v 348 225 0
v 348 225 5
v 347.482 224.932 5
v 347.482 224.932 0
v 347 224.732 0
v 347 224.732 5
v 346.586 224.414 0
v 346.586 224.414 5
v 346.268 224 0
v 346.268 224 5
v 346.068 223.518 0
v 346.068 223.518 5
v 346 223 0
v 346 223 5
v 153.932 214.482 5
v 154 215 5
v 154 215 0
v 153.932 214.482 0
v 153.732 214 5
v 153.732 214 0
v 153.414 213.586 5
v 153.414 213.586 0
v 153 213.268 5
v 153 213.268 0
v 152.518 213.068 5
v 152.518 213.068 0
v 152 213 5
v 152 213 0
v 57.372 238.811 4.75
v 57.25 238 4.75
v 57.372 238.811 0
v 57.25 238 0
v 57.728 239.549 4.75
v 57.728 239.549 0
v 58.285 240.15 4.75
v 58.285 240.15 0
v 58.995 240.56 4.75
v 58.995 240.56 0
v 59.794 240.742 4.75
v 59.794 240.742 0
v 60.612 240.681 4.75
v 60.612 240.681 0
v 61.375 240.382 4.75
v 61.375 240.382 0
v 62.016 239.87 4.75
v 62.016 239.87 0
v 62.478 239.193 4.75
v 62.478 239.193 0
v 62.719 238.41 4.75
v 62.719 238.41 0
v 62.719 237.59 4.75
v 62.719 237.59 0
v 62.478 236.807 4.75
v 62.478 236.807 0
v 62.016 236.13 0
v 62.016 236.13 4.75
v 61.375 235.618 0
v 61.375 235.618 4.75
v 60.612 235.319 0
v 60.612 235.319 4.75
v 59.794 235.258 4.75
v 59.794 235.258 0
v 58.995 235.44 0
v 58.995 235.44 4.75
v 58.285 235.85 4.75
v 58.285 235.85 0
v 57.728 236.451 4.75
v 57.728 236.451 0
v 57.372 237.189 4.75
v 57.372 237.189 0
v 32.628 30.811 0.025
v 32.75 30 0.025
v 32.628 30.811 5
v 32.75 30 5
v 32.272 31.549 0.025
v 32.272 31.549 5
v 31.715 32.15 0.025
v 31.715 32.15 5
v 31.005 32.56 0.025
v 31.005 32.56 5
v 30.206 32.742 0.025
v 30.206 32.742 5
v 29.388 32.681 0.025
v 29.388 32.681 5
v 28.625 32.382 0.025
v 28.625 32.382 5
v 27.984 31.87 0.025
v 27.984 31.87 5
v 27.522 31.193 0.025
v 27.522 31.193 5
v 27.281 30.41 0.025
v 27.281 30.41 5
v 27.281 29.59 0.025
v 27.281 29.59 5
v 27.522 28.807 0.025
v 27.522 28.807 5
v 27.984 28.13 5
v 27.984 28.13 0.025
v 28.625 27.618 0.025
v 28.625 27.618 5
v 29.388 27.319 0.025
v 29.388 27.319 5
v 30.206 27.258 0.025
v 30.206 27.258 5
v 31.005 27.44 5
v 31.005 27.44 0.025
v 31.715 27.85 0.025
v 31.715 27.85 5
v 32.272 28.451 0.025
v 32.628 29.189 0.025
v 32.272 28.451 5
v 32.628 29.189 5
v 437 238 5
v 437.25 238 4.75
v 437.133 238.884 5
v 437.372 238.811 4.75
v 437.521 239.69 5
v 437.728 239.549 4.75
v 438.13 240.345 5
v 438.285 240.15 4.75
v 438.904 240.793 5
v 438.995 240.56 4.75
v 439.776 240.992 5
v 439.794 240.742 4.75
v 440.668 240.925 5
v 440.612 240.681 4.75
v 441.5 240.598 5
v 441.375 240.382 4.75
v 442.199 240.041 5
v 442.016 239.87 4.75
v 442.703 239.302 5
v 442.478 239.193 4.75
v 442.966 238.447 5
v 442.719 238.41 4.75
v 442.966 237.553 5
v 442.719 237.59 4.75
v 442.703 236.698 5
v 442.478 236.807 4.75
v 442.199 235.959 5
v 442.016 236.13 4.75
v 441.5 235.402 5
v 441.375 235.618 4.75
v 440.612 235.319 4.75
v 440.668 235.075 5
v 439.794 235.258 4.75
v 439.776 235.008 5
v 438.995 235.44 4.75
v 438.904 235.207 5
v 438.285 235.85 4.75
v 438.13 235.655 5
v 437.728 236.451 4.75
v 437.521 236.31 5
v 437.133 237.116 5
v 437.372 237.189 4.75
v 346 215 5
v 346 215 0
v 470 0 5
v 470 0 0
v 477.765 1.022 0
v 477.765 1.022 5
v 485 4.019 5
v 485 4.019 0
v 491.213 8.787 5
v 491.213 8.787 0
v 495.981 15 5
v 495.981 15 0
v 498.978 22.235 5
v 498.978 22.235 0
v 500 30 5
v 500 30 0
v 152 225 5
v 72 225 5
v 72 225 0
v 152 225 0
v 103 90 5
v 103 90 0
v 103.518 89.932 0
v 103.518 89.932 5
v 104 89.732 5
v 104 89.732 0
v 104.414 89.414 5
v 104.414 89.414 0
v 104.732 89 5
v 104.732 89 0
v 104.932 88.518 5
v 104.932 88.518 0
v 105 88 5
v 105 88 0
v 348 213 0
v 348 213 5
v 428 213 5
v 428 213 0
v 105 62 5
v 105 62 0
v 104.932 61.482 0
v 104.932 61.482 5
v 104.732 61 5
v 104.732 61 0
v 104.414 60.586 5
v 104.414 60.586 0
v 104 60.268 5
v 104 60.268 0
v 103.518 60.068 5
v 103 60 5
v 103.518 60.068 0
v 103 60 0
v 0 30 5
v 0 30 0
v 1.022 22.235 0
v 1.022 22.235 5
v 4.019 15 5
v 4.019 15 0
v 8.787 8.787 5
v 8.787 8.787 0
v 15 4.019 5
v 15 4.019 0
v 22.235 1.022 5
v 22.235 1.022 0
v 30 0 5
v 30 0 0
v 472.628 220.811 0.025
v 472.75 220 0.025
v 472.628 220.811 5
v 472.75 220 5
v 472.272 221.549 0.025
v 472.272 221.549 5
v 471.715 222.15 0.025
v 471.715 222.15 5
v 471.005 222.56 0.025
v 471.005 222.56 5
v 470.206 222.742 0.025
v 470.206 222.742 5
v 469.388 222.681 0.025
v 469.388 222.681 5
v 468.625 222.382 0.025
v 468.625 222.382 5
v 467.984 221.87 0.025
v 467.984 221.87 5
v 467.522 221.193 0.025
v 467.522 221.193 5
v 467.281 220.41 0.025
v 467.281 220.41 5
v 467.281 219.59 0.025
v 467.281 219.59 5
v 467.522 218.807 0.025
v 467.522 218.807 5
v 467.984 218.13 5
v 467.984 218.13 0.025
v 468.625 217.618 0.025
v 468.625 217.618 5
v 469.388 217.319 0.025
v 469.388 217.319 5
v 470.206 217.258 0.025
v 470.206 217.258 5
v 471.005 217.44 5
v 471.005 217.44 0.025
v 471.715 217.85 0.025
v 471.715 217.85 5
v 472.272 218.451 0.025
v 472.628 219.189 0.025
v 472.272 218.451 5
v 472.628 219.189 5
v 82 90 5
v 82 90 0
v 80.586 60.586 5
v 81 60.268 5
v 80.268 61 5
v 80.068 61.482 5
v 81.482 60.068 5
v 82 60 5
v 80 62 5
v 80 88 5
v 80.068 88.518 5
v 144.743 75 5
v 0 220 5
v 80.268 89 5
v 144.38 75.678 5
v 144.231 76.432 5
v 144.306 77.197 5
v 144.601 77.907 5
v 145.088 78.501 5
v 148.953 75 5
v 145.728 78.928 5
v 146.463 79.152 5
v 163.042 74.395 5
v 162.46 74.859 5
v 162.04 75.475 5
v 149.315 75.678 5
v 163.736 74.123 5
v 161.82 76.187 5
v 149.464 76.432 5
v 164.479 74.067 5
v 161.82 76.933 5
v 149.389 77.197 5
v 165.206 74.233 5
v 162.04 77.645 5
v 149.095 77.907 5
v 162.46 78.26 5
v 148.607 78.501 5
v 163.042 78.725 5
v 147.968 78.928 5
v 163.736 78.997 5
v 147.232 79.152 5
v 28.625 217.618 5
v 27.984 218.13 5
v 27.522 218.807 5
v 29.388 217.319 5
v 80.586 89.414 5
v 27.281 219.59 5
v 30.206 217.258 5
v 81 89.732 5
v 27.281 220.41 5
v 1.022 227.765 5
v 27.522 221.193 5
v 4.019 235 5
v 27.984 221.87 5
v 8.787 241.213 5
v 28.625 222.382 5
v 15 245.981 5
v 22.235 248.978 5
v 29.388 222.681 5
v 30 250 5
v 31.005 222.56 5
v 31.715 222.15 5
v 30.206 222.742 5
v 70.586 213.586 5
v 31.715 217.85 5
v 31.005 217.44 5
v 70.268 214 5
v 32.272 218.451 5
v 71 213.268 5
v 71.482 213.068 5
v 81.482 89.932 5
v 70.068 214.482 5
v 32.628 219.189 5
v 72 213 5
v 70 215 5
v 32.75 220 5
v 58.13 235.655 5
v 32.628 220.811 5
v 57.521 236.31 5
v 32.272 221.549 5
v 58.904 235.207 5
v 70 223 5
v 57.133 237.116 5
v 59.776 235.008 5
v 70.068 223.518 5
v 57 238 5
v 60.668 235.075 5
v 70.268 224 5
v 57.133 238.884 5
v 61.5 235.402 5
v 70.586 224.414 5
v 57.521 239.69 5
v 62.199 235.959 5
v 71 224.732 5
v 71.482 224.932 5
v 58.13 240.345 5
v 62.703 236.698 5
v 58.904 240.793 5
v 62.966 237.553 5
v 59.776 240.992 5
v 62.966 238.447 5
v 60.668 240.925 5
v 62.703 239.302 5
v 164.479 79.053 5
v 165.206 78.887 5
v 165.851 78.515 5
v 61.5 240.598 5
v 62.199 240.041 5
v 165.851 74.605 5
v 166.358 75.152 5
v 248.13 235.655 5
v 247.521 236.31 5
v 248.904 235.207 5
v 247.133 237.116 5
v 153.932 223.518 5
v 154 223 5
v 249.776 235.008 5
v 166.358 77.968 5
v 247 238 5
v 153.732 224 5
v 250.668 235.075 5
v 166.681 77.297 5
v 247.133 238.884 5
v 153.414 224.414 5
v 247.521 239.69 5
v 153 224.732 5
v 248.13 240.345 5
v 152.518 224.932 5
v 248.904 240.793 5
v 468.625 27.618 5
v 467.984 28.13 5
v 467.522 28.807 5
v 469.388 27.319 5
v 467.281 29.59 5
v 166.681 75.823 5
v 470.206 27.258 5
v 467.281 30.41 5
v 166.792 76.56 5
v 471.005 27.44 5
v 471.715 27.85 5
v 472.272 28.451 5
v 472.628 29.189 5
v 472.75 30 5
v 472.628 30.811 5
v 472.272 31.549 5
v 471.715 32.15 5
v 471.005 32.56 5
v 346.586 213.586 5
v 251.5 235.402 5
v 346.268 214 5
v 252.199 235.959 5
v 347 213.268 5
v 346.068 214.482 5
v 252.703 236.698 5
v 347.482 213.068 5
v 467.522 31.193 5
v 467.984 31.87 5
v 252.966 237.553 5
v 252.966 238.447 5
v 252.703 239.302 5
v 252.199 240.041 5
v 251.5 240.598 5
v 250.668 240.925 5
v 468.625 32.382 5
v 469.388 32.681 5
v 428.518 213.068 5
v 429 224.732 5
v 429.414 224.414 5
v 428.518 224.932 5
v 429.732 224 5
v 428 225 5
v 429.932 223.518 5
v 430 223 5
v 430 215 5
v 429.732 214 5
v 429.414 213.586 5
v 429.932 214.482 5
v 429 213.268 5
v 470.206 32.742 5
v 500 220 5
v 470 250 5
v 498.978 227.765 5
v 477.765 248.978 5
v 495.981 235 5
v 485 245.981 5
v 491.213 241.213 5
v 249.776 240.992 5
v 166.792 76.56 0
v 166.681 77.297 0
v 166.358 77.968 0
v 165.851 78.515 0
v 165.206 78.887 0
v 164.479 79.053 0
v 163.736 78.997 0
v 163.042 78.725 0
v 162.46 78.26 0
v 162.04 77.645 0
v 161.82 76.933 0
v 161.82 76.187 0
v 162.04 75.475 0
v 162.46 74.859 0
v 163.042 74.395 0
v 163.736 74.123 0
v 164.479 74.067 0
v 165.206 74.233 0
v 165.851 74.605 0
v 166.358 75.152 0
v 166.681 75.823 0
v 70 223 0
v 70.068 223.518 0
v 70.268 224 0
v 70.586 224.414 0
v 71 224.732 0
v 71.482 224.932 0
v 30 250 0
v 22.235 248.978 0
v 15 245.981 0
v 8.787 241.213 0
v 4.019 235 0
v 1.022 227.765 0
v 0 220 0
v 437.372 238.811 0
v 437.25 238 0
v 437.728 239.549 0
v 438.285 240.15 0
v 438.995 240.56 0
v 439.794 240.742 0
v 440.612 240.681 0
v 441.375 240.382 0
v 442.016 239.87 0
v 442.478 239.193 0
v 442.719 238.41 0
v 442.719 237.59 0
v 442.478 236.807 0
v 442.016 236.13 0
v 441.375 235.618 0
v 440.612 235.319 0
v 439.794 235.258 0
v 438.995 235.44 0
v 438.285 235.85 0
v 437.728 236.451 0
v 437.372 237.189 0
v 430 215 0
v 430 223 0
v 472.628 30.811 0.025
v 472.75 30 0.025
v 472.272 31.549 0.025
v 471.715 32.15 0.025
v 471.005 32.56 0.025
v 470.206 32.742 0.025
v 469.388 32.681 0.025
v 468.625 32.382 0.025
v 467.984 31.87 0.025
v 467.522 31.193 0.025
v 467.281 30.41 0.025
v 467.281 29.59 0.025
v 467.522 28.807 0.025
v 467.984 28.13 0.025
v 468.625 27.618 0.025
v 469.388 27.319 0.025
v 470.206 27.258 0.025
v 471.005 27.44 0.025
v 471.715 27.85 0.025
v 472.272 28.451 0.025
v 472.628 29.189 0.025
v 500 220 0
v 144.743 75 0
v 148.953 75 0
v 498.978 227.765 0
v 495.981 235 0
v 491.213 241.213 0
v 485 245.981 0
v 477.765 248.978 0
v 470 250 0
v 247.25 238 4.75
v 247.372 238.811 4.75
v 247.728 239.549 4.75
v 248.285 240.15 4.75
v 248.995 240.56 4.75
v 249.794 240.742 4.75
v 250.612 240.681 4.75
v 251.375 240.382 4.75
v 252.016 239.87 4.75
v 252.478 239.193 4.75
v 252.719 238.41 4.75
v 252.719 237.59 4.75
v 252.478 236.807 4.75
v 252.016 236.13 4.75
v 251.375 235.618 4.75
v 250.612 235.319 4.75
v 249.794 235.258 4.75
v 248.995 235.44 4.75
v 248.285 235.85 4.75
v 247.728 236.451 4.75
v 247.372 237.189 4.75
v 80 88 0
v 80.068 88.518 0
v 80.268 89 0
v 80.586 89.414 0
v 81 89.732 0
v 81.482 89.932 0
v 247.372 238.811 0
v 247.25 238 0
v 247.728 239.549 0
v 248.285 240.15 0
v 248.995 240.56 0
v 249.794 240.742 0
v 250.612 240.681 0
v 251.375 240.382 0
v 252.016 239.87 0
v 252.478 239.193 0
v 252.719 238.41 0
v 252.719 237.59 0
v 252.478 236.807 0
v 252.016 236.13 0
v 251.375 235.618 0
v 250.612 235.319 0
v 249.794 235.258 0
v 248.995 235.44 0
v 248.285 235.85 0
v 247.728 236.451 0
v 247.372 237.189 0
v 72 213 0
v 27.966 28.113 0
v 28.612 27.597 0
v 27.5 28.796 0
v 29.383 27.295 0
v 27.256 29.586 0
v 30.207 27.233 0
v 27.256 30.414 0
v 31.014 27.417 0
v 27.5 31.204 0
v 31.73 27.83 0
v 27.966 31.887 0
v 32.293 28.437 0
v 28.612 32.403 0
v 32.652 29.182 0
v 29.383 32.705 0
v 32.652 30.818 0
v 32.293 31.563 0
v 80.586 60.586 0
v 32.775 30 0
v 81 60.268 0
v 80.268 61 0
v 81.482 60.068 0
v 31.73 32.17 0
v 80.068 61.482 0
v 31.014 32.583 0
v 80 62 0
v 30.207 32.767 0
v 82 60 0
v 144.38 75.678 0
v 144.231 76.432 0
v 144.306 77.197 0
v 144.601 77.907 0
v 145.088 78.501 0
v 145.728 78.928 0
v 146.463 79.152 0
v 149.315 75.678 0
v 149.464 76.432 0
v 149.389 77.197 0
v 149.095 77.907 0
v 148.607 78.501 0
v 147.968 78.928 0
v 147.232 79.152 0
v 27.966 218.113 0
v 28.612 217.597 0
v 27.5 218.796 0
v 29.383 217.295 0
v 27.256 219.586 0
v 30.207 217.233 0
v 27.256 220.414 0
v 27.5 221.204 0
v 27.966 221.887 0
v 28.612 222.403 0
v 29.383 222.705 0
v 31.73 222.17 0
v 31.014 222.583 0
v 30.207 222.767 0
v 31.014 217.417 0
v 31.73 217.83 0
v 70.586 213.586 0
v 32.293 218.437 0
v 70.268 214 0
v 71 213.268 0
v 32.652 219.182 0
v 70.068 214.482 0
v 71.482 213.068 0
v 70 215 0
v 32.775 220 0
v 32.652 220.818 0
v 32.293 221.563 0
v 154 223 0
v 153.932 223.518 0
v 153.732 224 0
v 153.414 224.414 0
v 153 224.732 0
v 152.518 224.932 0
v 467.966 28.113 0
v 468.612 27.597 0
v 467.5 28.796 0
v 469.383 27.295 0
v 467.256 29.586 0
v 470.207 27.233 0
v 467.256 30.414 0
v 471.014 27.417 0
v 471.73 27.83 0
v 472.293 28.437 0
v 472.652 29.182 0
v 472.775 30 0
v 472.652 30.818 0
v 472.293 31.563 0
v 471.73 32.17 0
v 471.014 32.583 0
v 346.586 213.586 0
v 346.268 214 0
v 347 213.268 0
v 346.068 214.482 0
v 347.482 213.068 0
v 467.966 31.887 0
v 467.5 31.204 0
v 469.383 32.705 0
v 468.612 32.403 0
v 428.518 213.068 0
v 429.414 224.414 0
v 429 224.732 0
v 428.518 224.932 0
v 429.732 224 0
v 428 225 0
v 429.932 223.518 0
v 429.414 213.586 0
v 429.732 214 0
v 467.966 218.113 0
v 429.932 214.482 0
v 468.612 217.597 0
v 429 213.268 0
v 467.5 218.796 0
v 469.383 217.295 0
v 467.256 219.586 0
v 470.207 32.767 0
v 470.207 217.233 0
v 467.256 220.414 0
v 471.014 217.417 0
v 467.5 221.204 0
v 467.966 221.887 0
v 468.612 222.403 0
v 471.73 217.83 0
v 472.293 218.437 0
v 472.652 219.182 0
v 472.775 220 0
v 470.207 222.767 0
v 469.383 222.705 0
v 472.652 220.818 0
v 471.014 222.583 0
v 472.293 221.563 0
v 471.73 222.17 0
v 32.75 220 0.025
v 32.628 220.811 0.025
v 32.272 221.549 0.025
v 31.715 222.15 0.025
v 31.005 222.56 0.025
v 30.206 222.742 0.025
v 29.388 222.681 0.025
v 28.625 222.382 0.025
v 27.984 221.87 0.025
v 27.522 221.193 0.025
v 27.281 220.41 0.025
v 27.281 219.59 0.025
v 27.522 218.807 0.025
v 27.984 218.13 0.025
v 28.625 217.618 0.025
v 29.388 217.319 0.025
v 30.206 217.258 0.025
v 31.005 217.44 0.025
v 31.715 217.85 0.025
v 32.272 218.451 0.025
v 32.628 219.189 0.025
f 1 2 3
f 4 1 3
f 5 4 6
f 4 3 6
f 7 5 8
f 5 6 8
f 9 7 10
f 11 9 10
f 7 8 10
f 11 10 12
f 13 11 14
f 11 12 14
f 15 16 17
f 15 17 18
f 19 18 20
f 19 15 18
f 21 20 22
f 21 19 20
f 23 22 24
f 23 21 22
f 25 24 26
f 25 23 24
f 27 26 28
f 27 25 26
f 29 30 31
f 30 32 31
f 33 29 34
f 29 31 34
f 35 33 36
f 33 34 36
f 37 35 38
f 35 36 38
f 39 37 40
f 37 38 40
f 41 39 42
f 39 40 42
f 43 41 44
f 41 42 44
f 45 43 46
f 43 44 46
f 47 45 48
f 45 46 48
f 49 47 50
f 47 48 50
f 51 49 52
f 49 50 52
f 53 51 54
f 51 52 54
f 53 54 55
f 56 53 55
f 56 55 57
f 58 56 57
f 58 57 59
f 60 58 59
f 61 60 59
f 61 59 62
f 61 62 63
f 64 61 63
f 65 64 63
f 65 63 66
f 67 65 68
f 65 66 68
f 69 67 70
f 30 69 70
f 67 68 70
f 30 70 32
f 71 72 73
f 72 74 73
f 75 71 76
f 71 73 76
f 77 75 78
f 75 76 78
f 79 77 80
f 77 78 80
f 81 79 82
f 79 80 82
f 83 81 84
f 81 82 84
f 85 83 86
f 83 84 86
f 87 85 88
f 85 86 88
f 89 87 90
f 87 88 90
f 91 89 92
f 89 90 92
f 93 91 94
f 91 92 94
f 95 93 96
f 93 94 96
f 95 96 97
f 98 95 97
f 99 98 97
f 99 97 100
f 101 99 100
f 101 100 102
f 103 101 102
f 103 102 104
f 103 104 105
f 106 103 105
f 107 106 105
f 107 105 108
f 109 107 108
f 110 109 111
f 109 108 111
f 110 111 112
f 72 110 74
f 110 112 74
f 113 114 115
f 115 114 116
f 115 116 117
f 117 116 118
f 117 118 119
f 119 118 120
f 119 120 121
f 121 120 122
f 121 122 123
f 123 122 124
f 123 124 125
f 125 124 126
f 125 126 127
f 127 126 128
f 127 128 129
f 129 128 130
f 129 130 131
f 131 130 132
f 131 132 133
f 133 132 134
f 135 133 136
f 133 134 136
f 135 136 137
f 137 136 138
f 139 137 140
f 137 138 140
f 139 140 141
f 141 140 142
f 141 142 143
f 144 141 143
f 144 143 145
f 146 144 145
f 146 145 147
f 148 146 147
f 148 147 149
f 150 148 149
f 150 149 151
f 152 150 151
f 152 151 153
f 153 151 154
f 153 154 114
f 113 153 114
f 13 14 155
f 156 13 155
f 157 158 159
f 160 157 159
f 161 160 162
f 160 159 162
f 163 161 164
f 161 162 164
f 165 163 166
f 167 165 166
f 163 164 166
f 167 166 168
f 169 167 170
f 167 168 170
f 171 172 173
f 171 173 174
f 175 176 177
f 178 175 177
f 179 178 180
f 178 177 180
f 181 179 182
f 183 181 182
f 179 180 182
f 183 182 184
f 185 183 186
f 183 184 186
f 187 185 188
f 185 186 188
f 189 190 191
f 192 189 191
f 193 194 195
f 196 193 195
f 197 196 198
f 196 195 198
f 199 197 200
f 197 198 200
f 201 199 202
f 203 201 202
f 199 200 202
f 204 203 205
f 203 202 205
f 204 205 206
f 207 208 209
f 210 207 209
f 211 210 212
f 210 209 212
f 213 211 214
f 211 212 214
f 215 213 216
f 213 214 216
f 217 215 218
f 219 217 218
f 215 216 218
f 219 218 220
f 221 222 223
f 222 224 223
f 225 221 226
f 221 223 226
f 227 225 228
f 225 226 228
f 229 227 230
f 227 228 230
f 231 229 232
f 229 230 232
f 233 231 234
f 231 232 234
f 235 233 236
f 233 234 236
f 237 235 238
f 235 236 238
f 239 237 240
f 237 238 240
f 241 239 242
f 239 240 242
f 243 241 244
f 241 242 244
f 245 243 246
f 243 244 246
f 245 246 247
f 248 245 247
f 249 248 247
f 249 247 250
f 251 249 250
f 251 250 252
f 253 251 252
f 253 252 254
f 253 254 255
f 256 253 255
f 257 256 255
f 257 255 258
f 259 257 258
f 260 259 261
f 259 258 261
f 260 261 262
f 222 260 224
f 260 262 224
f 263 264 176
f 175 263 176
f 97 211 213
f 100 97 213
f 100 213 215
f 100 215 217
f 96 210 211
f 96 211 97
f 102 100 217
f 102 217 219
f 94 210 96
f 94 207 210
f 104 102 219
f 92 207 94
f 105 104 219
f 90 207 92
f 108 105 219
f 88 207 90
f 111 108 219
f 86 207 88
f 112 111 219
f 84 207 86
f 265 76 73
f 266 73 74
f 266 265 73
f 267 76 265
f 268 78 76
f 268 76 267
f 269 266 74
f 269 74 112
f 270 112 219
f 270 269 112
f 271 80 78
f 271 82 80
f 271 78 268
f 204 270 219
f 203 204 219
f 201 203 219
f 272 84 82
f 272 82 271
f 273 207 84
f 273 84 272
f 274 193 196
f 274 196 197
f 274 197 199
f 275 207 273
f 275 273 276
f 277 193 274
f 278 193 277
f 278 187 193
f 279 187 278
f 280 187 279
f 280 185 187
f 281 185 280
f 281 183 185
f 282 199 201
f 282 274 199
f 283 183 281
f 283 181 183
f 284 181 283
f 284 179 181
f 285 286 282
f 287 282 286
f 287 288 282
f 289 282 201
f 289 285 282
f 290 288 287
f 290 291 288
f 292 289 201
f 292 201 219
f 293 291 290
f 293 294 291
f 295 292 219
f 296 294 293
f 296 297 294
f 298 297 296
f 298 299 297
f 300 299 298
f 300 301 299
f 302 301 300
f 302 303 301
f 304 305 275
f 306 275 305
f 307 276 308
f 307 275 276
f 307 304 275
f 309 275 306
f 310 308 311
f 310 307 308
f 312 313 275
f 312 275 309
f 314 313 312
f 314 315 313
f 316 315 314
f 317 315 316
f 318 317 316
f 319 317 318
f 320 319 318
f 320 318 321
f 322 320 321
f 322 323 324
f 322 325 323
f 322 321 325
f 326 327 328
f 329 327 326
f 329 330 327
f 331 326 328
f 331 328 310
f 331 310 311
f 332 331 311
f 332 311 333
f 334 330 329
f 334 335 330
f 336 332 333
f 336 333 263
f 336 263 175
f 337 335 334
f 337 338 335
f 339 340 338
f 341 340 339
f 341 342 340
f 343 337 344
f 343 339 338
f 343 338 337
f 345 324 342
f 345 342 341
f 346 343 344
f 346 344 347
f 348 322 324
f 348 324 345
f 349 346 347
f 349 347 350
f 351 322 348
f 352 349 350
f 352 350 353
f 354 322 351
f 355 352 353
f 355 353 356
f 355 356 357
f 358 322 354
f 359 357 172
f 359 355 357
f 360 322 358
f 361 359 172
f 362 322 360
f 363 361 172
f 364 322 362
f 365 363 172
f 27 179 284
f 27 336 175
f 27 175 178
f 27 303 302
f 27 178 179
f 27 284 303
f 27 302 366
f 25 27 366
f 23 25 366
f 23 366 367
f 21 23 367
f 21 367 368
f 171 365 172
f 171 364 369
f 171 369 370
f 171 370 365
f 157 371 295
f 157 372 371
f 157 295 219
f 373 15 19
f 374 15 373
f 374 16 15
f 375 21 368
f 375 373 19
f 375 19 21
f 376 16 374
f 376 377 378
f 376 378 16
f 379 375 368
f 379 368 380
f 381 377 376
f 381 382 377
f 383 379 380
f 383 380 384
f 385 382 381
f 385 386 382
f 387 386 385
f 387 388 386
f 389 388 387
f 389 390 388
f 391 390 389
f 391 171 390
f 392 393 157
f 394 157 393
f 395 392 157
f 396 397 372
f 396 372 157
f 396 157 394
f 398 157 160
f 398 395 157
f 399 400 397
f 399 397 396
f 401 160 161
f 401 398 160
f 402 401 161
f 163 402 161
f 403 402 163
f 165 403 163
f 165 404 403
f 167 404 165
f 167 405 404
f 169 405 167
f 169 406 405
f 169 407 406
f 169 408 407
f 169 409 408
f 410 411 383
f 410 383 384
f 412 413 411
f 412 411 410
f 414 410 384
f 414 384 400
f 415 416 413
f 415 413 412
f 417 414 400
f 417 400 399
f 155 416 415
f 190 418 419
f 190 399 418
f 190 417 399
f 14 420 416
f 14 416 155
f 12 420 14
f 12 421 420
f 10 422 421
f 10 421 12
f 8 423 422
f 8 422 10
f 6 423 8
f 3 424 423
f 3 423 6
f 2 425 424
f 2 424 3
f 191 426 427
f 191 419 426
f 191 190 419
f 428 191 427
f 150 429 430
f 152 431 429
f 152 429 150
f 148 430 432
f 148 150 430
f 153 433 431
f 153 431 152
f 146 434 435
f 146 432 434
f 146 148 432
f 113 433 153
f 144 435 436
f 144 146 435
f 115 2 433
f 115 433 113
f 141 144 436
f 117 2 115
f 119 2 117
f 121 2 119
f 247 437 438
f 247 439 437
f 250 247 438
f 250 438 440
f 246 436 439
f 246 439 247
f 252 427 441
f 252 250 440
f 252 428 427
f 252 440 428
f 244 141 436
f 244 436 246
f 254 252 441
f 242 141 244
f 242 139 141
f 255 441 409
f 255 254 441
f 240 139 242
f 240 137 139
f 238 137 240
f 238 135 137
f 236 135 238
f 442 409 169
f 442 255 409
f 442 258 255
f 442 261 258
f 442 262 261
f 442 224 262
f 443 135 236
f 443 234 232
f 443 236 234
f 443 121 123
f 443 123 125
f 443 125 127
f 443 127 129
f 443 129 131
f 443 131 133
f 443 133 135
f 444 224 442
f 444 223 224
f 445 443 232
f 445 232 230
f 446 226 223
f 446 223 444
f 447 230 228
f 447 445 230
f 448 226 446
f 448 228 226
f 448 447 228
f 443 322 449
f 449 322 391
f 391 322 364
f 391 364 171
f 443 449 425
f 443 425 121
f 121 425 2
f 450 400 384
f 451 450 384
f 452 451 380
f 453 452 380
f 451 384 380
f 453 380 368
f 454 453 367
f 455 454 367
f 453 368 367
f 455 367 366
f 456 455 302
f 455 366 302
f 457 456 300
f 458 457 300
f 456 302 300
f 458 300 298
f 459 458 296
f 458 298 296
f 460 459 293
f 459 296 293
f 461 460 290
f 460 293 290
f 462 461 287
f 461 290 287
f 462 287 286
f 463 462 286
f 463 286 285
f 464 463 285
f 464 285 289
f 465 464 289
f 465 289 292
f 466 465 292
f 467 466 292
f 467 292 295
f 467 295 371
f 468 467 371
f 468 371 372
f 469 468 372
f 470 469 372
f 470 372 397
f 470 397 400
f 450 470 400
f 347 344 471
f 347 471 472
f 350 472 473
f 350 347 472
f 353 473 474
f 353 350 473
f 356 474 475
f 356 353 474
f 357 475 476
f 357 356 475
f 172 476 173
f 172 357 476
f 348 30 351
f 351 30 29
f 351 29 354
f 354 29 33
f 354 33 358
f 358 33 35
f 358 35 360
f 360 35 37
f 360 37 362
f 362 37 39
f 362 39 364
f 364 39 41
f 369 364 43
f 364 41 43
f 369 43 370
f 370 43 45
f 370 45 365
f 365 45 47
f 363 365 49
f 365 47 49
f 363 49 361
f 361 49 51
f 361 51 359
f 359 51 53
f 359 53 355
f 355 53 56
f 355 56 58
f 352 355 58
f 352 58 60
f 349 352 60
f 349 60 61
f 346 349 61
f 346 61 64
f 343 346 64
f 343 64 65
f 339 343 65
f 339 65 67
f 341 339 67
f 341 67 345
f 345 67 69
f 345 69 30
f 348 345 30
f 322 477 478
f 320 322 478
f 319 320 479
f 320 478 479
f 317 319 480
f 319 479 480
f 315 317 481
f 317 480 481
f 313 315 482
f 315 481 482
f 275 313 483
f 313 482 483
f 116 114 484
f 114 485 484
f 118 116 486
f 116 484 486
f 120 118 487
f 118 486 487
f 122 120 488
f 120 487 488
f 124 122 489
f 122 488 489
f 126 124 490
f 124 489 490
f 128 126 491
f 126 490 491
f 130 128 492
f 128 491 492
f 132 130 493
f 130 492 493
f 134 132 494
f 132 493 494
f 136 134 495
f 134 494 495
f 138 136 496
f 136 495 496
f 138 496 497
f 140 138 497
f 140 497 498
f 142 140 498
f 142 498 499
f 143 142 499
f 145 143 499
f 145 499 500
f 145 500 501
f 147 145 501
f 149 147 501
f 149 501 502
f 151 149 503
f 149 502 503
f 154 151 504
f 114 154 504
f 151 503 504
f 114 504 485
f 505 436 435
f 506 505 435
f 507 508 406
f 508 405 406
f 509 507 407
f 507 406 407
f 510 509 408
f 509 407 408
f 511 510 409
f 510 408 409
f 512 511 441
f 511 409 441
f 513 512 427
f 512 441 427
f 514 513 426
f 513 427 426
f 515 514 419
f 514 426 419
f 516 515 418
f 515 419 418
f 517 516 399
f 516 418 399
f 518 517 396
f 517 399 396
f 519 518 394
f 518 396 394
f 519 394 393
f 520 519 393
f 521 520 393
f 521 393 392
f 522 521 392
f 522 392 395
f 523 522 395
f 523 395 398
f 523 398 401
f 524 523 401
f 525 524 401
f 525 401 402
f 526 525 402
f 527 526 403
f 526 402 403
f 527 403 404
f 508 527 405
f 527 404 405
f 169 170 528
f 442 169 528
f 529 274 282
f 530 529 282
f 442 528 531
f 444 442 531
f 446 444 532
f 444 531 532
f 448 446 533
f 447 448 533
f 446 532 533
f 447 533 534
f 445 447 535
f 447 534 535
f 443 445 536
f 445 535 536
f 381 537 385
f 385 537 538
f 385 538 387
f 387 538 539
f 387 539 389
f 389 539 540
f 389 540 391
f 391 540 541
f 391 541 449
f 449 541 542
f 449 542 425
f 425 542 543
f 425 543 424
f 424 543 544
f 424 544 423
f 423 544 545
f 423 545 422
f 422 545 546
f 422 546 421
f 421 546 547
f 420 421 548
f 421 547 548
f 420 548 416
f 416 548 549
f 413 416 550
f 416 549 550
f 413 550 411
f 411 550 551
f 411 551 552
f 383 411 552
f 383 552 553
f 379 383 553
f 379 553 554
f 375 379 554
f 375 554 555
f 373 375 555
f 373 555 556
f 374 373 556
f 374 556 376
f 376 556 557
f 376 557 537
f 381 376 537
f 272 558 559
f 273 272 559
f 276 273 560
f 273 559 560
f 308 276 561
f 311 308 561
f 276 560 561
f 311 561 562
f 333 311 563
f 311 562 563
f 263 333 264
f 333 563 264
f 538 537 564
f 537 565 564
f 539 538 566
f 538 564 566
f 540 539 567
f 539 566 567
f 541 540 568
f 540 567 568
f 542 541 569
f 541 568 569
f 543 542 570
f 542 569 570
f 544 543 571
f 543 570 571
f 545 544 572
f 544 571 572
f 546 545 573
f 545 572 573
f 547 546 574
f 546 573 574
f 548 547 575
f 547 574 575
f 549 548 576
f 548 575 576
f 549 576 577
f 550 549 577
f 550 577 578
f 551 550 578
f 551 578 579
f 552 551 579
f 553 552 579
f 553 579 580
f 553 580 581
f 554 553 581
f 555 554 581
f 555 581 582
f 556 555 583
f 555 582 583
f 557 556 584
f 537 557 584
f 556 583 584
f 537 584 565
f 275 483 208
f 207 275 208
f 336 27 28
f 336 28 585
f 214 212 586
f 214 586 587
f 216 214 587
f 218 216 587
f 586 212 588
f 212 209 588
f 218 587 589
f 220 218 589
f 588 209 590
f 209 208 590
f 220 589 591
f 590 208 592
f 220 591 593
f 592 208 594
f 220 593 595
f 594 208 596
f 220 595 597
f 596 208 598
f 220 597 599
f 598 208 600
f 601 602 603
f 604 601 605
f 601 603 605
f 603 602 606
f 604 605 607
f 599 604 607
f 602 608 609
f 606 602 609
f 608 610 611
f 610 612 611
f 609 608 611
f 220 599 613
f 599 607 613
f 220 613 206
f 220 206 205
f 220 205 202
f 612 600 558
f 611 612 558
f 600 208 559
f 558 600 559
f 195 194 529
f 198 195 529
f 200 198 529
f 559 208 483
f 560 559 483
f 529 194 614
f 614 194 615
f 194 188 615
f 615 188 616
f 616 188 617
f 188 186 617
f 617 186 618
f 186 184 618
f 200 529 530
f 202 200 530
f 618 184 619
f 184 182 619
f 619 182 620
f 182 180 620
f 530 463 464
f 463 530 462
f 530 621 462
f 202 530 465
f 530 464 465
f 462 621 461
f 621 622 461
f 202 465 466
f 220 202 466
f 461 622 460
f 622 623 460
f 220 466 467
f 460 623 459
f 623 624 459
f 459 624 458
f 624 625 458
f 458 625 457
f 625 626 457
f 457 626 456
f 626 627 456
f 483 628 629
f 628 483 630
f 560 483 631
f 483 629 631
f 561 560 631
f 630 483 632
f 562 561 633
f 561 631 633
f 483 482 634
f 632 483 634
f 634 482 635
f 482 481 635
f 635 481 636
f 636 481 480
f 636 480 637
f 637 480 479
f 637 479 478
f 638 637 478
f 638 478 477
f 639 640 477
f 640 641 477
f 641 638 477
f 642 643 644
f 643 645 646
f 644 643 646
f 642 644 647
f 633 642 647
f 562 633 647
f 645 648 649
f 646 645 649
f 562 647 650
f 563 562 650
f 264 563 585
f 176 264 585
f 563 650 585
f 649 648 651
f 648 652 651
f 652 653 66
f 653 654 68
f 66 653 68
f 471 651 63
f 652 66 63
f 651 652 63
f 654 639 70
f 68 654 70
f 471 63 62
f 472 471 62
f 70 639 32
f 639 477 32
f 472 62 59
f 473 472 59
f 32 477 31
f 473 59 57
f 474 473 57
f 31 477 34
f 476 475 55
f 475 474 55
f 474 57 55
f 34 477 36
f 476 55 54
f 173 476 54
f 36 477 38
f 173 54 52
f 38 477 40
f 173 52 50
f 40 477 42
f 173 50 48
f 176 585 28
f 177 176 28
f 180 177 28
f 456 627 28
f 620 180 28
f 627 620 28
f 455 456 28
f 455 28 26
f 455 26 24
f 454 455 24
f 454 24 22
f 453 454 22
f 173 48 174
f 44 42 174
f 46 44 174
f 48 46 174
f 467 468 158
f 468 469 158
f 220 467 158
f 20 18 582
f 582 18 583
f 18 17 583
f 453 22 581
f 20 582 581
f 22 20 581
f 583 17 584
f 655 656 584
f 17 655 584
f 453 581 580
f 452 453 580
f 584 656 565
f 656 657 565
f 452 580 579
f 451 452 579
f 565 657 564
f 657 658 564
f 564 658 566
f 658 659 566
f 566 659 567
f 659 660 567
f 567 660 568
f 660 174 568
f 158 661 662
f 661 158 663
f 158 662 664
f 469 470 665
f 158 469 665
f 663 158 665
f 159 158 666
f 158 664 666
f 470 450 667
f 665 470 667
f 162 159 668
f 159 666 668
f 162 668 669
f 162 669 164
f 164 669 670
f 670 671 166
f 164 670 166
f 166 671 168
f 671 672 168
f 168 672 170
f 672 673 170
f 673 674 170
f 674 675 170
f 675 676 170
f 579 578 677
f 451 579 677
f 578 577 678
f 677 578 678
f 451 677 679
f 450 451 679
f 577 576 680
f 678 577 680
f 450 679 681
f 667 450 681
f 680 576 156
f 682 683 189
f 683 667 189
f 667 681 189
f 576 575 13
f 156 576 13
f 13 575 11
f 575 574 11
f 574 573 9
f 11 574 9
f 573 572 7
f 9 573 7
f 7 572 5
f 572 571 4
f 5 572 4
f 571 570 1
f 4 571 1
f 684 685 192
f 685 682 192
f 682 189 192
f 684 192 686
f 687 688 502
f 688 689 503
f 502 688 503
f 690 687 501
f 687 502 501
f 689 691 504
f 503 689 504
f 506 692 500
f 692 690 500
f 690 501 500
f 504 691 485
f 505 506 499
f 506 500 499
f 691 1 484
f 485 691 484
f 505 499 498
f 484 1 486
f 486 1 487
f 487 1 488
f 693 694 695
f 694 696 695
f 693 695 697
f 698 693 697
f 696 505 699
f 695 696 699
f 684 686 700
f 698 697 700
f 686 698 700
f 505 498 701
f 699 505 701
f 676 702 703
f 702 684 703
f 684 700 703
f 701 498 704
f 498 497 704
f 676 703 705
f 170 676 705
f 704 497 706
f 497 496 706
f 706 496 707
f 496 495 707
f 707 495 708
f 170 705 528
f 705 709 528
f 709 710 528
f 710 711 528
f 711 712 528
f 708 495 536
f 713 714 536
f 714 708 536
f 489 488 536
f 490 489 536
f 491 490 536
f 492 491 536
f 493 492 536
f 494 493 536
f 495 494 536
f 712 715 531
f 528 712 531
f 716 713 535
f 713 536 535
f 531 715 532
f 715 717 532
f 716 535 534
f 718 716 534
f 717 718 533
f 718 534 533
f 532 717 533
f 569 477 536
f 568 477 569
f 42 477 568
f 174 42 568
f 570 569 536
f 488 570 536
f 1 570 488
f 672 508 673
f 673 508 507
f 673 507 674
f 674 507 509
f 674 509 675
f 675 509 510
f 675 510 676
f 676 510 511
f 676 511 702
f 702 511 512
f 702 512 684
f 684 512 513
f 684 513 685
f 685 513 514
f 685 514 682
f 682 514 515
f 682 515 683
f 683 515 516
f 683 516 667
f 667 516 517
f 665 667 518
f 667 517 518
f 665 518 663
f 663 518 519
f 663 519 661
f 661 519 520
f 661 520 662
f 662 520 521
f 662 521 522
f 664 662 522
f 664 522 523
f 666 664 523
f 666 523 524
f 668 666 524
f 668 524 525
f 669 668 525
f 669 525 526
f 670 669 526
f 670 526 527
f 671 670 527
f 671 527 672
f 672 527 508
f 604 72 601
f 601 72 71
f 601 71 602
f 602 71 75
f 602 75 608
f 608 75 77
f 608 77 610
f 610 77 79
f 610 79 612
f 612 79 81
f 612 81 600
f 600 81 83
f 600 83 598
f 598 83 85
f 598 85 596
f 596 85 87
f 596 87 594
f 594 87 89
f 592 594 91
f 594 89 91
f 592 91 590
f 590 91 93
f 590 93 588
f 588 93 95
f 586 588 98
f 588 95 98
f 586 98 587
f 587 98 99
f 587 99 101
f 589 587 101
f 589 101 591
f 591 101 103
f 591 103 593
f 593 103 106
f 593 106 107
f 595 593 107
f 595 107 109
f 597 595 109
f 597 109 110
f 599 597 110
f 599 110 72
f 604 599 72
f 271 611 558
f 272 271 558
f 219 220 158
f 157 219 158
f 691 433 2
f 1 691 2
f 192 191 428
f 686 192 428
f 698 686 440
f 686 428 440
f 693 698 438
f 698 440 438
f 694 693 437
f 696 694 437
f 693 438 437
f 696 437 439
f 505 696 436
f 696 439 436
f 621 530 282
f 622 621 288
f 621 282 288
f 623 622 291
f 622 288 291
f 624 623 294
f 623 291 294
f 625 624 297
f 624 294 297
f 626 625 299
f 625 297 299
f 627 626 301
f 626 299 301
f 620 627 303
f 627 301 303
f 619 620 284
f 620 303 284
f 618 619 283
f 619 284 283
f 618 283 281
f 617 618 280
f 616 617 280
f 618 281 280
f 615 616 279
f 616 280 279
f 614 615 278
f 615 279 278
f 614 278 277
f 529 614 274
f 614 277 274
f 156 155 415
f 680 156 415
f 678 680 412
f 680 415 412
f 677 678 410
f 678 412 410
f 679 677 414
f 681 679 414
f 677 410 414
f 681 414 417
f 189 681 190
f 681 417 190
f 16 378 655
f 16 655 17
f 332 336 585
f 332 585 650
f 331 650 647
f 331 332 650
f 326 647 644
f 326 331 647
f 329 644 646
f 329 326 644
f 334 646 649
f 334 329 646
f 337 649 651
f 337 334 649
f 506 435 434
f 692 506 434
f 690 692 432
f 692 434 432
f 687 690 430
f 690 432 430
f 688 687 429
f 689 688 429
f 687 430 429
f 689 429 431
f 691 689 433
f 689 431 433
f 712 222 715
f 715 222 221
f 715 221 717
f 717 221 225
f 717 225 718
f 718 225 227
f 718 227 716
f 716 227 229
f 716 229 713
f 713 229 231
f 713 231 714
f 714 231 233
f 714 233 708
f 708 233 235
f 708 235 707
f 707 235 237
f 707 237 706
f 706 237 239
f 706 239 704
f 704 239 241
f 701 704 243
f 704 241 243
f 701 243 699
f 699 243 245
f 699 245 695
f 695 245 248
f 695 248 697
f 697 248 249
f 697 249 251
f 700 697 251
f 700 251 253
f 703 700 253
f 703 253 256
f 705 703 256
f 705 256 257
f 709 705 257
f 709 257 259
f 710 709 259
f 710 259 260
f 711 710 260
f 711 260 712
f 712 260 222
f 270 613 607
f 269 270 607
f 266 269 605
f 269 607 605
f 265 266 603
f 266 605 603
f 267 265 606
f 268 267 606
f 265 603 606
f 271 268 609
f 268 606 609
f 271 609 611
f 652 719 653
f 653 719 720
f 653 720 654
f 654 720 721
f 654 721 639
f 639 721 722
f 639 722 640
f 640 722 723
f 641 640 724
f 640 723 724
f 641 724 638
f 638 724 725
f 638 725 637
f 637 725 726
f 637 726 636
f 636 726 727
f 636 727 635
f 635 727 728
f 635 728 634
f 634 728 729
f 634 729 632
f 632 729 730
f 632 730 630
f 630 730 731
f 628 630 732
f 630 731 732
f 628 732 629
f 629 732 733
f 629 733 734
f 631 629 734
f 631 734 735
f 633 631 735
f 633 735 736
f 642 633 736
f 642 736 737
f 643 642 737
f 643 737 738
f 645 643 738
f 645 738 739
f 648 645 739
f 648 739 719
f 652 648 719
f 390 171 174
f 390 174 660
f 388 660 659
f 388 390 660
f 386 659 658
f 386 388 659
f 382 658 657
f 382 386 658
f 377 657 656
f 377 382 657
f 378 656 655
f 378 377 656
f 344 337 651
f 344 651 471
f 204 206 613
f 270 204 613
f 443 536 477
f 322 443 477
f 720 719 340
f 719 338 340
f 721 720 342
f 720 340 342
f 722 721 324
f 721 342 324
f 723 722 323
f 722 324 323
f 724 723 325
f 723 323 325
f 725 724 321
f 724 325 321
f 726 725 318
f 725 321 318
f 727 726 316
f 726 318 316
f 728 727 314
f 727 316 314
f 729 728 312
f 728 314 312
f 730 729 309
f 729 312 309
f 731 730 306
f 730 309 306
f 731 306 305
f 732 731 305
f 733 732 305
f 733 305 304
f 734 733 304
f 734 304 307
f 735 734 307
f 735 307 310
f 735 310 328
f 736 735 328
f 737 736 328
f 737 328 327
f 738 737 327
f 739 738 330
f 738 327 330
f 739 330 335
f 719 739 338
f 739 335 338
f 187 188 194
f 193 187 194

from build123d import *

# Parameters (mm, degrees)
BOSS_EXTRU_1_DEPTH         = 5
D_GAGEMENT_M51_D           = 5.5
D_GAGEMENT_M51_CSINK_D     = 5.55
D_GAGEMENT_M51_CSINK_ANGLE = 90
ENL_V_MAT_EXTRU_1_DEPTH    = 560.039354608
D_GAGEMENT_M52_D           = 5.5
D_GAGEMENT_M52_CSINK_D     = 6
D_GAGEMENT_M52_CSINK_ANGLE = 90
ENL_V_MAT_EXTRU_2_DEPTH    = 560.039354608
ENL_V_MAT_EXTRU_3_DEPTH    = 560.039354608
ESQUISSE15_R               = 2.5
ENL_V_MAT_EXTRU_4_DEPTH    = 560.039354608


with BuildPart() as part:
    # Esquisse1 → Boss.-Extru.1 (new body)
    with BuildSketch(Plane.XY):
        with BuildLine():
            Line((30, 0), (470, 0))
            ThreePointArc((470, 0), (491.213203436, 8.786796564), (500, 30))
            Line((500, 30), (500, 220))
            ThreePointArc((500, 220), (491.213203436, 241.213203436), (470, 250))
            Line((470, 250), (30, 250))
            ThreePointArc((30, 250), (8.786796564, 241.213203436), (0, 220))
            Line((0, 220), (0, 30))
            ThreePointArc((0, 30), (8.786796564, 8.786796564), (30, 0))
        make_face()
    extrude(amount=BOSS_EXTRU_1_DEPTH)

    # Dégagement M51 (through all)
    with Locations(Plane(origin=(0, 0, 0), x_dir=(-1, 0, 0), z_dir=(0, 0, -1))):
        with Locations((-470, 220), (-470, 30), (-30, 30), (-30, 220)):
            CounterSinkHole(D_GAGEMENT_M51_D / 2, D_GAGEMENT_M51_CSINK_D / 2, counter_sink_angle=D_GAGEMENT_M51_CSINK_ANGLE)

    # Esquisse8 → Enlèv. mat.-Extru.1 (cut, through all)
    with BuildSketch(Plane.XY.offset(5)):
        with BuildLine():
            Line((72, 225), (152, 225))
            ThreePointArc((152, 225), (153.414213562, 224.414213562), (154, 223))
            Line((154, 223), (154, 215))
            ThreePointArc((154, 215), (153.414213562, 213.585786438), (152, 213))
            Line((152, 213), (72, 213))
            ThreePointArc((72, 213), (70.585786438, 213.585786438), (70, 215))
            Line((70, 215), (70, 223))
            ThreePointArc((70, 223), (70.585786438, 224.414213562), (72, 225))
        make_face()
        with BuildLine():
            Line((346, 223), (346, 215))
            ThreePointArc((346, 215), (346.585786438, 213.585786438), (348, 213))
            Line((348, 213), (428, 213))
            ThreePointArc((428, 213), (429.414213562, 213.585786438), (430, 215))
            Line((430, 215), (430, 223))
            ThreePointArc((430, 223), (429.414213562, 224.414213562), (428, 225))
            Line((428, 225), (348, 225))
            ThreePointArc((348, 225), (346.585786438, 224.414213562), (346, 223))
        make_face()
    extrude(amount=-ENL_V_MAT_EXTRU_1_DEPTH, mode=Mode.SUBTRACT)

    # Dégagement M52 (through all)
    with Locations(Plane.XY.offset(5)):
        with Locations((60, 238), (440, 238), (250, 238)):
            CounterSinkHole(D_GAGEMENT_M52_D / 2, D_GAGEMENT_M52_CSINK_D / 2, counter_sink_angle=D_GAGEMENT_M52_CSINK_ANGLE)

    # Esquisse13 → Enlèv. mat.-Extru.2 (cut, through all)
    with BuildSketch(Plane(origin=(0, 0, 0), x_dir=(-1, 0, 0), z_dir=(0, 0, -1))):
        with BuildLine():
            Line((-105, 88), (-105, 62))
            ThreePointArc((-105, 62), (-104.414213562, 60.585786438), (-103, 60))
            Line((-103, 60), (-82, 60))
            ThreePointArc((-82, 60), (-80.585786438, 60.585786438), (-80, 62))
            Line((-80, 62), (-80, 88))
            ThreePointArc((-80, 88), (-80.585786438, 89.414213562), (-82, 90))
            Line((-82, 90), (-103, 90))
            ThreePointArc((-103, 90), (-104.414213562, 89.414213562), (-105, 88))
        make_face()
    extrude(amount=-ENL_V_MAT_EXTRU_2_DEPTH, mode=Mode.SUBTRACT)

    # Esquisse14 → Enlèv. mat.-Extru.3 (cut, through all)
    with BuildSketch(Plane.XY.offset(5)):
        with BuildLine():
            Line((144.742586668, 75), (148.952586668, 75))
            ThreePointArc((148.952586668, 75), (146.847586668, 79.179927883), (144.742586668, 75))
        make_face()
    extrude(amount=-ENL_V_MAT_EXTRU_3_DEPTH, mode=Mode.SUBTRACT)

    # Esquisse15 → Enlèv. mat.-Extru.4 (cut, through all)
    with BuildSketch(Plane.XY.offset(5)):
        with Locations((164.292422871, 76.559927883)):
            Circle(ESQUISSE15_R)
    extrude(amount=-ENL_V_MAT_EXTRU_4_DEPTH, mode=Mode.SUBTRACT)


solid = part.part
